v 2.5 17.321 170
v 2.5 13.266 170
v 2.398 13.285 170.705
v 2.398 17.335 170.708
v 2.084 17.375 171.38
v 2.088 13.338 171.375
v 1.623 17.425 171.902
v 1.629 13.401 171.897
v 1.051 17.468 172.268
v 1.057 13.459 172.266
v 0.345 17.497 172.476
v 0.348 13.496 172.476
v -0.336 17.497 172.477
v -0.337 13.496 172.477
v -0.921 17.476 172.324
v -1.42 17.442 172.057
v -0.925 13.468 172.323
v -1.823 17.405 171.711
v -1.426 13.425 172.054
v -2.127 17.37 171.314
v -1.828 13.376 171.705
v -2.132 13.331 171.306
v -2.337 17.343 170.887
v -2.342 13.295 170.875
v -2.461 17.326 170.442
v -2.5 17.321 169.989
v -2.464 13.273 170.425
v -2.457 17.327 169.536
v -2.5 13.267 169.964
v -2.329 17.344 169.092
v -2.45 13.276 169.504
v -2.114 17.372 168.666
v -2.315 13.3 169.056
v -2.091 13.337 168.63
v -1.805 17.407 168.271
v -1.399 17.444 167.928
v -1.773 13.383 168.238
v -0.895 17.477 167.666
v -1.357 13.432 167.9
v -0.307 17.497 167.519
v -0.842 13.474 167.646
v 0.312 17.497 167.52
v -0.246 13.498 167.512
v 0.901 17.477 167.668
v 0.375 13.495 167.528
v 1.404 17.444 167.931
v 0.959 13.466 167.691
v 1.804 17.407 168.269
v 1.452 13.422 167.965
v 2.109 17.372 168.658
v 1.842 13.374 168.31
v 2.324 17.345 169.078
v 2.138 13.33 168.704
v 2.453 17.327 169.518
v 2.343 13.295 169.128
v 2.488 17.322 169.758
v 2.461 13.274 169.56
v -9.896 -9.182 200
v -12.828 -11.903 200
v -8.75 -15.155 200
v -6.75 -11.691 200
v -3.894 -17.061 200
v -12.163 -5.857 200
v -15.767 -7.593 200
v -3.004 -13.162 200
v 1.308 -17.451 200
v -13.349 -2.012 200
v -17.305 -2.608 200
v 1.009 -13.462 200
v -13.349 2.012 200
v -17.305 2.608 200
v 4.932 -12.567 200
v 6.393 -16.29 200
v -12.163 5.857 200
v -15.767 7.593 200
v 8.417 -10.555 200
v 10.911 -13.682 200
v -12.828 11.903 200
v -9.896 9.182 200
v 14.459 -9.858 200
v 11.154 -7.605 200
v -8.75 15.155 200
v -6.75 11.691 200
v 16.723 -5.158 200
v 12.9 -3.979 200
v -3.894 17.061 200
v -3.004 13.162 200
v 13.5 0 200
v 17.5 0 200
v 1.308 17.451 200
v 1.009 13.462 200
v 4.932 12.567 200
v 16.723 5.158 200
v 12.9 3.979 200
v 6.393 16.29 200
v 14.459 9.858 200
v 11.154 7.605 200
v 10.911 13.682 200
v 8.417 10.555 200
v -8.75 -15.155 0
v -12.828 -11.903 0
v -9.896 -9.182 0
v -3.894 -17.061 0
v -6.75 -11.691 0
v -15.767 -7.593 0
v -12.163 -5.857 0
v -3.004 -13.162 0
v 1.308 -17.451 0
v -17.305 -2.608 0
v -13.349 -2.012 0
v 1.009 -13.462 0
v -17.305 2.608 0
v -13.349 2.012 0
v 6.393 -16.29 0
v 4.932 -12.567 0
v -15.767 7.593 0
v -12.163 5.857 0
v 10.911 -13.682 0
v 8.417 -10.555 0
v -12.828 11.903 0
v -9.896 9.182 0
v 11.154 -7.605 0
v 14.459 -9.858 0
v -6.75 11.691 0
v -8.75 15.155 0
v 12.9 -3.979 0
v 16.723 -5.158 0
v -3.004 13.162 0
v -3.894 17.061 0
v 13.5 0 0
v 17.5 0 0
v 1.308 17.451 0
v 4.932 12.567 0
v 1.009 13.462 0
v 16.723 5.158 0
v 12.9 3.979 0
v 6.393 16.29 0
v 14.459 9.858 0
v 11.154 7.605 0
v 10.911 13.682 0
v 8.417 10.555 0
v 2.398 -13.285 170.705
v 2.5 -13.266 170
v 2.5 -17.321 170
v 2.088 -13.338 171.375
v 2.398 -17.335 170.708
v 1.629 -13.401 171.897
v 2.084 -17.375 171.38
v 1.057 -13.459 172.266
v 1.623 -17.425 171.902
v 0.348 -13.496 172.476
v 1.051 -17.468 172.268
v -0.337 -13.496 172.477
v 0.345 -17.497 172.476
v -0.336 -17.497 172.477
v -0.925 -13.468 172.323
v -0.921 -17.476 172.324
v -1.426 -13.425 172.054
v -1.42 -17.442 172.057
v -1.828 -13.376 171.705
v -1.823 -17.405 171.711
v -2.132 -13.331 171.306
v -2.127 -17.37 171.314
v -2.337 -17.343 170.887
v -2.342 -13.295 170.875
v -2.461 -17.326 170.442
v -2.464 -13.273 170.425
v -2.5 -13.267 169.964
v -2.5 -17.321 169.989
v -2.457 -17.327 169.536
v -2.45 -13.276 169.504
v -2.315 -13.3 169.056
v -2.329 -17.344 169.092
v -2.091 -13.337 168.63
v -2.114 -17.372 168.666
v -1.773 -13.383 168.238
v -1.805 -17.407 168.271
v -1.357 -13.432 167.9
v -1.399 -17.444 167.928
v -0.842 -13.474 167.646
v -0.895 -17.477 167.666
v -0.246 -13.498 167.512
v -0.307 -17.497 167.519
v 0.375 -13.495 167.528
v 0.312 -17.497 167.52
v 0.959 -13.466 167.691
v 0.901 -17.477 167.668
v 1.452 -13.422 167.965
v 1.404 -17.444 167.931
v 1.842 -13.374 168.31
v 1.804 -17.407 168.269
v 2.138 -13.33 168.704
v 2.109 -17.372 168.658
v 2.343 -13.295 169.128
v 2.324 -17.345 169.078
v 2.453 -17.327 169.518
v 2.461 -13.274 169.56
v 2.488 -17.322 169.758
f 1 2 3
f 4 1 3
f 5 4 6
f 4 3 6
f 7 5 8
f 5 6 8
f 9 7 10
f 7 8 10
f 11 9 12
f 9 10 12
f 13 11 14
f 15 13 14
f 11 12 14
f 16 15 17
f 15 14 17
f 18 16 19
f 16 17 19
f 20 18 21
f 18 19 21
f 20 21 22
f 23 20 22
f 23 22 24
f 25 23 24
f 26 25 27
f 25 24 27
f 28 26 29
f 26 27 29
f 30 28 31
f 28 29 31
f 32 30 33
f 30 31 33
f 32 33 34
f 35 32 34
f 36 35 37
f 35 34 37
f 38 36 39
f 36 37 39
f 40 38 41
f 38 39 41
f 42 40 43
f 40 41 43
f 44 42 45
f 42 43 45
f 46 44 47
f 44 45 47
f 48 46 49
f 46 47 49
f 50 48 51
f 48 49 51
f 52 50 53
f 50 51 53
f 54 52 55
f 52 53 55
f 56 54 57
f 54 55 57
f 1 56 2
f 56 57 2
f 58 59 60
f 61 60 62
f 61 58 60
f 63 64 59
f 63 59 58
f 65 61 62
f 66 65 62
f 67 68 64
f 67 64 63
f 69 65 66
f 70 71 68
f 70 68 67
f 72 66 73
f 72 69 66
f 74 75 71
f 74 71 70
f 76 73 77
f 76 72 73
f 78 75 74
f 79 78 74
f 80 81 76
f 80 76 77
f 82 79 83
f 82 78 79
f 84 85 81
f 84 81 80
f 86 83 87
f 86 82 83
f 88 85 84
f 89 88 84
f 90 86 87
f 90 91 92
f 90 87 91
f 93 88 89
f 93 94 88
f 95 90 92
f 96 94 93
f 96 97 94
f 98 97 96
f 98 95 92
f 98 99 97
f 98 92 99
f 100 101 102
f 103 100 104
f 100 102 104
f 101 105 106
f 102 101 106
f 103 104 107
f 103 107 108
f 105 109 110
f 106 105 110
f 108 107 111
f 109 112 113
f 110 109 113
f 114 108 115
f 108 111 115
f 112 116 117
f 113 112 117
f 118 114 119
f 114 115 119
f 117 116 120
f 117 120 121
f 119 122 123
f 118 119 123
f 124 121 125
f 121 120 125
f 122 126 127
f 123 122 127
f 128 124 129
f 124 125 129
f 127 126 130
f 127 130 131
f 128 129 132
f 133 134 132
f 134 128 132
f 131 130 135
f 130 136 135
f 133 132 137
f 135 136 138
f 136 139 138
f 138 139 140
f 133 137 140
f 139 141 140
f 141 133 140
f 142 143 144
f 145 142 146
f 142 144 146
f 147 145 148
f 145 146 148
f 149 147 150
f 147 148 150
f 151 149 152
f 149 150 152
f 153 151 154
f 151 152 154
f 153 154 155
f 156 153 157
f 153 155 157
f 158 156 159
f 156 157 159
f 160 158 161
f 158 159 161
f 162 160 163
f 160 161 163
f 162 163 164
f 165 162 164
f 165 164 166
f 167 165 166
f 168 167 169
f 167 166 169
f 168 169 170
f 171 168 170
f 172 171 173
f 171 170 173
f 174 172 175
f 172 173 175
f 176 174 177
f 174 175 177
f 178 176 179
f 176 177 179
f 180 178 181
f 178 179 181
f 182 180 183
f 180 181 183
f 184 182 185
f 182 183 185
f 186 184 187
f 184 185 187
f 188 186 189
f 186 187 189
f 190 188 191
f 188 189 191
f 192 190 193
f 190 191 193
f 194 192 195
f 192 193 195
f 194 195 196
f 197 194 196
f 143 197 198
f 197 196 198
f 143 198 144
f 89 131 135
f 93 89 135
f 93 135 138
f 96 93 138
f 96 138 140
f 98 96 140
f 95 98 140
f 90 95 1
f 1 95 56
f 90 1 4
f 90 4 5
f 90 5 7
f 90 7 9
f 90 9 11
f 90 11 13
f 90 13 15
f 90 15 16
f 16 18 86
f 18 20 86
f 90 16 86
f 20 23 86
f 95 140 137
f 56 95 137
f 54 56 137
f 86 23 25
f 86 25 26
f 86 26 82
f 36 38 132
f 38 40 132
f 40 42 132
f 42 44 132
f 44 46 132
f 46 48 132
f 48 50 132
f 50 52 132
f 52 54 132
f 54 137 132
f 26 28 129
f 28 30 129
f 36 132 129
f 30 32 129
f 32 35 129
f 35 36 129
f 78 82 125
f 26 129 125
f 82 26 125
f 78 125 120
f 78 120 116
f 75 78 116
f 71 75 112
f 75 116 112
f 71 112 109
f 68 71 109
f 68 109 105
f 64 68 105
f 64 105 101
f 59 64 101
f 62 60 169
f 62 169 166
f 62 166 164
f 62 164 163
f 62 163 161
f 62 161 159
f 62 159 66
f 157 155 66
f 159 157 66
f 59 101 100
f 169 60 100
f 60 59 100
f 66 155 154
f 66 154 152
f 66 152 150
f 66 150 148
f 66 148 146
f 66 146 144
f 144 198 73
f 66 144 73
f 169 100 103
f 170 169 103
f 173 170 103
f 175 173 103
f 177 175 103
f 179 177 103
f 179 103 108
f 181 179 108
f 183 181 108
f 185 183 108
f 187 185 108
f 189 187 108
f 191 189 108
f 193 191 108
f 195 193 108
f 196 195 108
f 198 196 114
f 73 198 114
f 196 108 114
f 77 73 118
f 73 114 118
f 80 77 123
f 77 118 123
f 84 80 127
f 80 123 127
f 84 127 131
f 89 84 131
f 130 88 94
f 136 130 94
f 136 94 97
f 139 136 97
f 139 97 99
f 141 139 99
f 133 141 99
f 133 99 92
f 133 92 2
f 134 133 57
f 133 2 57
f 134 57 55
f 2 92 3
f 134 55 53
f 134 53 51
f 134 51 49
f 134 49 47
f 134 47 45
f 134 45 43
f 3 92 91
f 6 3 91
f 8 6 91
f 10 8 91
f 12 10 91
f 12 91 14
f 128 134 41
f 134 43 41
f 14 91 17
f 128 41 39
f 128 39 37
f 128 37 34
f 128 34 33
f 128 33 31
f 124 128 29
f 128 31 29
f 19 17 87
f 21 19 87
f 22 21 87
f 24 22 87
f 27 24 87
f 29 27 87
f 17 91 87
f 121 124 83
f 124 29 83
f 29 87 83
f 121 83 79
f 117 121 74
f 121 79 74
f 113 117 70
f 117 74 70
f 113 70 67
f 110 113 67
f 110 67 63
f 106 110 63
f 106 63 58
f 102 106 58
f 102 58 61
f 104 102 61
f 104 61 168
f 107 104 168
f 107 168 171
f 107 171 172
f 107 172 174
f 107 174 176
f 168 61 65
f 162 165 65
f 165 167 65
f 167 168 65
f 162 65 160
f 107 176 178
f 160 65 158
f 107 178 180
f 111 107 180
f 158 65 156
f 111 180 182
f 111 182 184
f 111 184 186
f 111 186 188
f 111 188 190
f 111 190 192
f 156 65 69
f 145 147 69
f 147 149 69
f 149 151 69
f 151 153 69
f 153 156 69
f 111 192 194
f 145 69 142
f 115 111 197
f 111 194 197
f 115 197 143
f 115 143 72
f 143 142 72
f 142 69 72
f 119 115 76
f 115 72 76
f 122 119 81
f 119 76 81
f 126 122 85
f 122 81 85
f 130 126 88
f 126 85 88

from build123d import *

# Parameters (mm, degrees)
F0_R          = 17.5
F1_DEPTH      = 200
F2_R          = 2.5
F3_DEPTH      = 25
F3_DEPTH_BACK = 25
F4_R          = 13.5
F5_DEPTH      = 1022


with BuildPart() as f1:
    # F0 (on Top) → F1 (new body)
    with BuildSketch(Plane.XY):
        Circle(F0_R)
    extrude(amount=F1_DEPTH)

    # F2 (on Front) → F3 (cut, two sides)
    with BuildSketch(Plane.XZ) as f3_sk:
        with Locations((0, 170)):
            Circle(F2_R)
    extrude(amount=-F3_DEPTH, mode=Mode.SUBTRACT)
    extrude(f3_sk.sketch, amount=F3_DEPTH_BACK, mode=Mode.SUBTRACT)

    # F4 (on face) → F5 (cut)
    with BuildSketch(Plane.XY.offset(200)):
        Circle(F4_R)
    extrude(amount=-F5_DEPTH, mode=Mode.SUBTRACT)


solid = f1.part
